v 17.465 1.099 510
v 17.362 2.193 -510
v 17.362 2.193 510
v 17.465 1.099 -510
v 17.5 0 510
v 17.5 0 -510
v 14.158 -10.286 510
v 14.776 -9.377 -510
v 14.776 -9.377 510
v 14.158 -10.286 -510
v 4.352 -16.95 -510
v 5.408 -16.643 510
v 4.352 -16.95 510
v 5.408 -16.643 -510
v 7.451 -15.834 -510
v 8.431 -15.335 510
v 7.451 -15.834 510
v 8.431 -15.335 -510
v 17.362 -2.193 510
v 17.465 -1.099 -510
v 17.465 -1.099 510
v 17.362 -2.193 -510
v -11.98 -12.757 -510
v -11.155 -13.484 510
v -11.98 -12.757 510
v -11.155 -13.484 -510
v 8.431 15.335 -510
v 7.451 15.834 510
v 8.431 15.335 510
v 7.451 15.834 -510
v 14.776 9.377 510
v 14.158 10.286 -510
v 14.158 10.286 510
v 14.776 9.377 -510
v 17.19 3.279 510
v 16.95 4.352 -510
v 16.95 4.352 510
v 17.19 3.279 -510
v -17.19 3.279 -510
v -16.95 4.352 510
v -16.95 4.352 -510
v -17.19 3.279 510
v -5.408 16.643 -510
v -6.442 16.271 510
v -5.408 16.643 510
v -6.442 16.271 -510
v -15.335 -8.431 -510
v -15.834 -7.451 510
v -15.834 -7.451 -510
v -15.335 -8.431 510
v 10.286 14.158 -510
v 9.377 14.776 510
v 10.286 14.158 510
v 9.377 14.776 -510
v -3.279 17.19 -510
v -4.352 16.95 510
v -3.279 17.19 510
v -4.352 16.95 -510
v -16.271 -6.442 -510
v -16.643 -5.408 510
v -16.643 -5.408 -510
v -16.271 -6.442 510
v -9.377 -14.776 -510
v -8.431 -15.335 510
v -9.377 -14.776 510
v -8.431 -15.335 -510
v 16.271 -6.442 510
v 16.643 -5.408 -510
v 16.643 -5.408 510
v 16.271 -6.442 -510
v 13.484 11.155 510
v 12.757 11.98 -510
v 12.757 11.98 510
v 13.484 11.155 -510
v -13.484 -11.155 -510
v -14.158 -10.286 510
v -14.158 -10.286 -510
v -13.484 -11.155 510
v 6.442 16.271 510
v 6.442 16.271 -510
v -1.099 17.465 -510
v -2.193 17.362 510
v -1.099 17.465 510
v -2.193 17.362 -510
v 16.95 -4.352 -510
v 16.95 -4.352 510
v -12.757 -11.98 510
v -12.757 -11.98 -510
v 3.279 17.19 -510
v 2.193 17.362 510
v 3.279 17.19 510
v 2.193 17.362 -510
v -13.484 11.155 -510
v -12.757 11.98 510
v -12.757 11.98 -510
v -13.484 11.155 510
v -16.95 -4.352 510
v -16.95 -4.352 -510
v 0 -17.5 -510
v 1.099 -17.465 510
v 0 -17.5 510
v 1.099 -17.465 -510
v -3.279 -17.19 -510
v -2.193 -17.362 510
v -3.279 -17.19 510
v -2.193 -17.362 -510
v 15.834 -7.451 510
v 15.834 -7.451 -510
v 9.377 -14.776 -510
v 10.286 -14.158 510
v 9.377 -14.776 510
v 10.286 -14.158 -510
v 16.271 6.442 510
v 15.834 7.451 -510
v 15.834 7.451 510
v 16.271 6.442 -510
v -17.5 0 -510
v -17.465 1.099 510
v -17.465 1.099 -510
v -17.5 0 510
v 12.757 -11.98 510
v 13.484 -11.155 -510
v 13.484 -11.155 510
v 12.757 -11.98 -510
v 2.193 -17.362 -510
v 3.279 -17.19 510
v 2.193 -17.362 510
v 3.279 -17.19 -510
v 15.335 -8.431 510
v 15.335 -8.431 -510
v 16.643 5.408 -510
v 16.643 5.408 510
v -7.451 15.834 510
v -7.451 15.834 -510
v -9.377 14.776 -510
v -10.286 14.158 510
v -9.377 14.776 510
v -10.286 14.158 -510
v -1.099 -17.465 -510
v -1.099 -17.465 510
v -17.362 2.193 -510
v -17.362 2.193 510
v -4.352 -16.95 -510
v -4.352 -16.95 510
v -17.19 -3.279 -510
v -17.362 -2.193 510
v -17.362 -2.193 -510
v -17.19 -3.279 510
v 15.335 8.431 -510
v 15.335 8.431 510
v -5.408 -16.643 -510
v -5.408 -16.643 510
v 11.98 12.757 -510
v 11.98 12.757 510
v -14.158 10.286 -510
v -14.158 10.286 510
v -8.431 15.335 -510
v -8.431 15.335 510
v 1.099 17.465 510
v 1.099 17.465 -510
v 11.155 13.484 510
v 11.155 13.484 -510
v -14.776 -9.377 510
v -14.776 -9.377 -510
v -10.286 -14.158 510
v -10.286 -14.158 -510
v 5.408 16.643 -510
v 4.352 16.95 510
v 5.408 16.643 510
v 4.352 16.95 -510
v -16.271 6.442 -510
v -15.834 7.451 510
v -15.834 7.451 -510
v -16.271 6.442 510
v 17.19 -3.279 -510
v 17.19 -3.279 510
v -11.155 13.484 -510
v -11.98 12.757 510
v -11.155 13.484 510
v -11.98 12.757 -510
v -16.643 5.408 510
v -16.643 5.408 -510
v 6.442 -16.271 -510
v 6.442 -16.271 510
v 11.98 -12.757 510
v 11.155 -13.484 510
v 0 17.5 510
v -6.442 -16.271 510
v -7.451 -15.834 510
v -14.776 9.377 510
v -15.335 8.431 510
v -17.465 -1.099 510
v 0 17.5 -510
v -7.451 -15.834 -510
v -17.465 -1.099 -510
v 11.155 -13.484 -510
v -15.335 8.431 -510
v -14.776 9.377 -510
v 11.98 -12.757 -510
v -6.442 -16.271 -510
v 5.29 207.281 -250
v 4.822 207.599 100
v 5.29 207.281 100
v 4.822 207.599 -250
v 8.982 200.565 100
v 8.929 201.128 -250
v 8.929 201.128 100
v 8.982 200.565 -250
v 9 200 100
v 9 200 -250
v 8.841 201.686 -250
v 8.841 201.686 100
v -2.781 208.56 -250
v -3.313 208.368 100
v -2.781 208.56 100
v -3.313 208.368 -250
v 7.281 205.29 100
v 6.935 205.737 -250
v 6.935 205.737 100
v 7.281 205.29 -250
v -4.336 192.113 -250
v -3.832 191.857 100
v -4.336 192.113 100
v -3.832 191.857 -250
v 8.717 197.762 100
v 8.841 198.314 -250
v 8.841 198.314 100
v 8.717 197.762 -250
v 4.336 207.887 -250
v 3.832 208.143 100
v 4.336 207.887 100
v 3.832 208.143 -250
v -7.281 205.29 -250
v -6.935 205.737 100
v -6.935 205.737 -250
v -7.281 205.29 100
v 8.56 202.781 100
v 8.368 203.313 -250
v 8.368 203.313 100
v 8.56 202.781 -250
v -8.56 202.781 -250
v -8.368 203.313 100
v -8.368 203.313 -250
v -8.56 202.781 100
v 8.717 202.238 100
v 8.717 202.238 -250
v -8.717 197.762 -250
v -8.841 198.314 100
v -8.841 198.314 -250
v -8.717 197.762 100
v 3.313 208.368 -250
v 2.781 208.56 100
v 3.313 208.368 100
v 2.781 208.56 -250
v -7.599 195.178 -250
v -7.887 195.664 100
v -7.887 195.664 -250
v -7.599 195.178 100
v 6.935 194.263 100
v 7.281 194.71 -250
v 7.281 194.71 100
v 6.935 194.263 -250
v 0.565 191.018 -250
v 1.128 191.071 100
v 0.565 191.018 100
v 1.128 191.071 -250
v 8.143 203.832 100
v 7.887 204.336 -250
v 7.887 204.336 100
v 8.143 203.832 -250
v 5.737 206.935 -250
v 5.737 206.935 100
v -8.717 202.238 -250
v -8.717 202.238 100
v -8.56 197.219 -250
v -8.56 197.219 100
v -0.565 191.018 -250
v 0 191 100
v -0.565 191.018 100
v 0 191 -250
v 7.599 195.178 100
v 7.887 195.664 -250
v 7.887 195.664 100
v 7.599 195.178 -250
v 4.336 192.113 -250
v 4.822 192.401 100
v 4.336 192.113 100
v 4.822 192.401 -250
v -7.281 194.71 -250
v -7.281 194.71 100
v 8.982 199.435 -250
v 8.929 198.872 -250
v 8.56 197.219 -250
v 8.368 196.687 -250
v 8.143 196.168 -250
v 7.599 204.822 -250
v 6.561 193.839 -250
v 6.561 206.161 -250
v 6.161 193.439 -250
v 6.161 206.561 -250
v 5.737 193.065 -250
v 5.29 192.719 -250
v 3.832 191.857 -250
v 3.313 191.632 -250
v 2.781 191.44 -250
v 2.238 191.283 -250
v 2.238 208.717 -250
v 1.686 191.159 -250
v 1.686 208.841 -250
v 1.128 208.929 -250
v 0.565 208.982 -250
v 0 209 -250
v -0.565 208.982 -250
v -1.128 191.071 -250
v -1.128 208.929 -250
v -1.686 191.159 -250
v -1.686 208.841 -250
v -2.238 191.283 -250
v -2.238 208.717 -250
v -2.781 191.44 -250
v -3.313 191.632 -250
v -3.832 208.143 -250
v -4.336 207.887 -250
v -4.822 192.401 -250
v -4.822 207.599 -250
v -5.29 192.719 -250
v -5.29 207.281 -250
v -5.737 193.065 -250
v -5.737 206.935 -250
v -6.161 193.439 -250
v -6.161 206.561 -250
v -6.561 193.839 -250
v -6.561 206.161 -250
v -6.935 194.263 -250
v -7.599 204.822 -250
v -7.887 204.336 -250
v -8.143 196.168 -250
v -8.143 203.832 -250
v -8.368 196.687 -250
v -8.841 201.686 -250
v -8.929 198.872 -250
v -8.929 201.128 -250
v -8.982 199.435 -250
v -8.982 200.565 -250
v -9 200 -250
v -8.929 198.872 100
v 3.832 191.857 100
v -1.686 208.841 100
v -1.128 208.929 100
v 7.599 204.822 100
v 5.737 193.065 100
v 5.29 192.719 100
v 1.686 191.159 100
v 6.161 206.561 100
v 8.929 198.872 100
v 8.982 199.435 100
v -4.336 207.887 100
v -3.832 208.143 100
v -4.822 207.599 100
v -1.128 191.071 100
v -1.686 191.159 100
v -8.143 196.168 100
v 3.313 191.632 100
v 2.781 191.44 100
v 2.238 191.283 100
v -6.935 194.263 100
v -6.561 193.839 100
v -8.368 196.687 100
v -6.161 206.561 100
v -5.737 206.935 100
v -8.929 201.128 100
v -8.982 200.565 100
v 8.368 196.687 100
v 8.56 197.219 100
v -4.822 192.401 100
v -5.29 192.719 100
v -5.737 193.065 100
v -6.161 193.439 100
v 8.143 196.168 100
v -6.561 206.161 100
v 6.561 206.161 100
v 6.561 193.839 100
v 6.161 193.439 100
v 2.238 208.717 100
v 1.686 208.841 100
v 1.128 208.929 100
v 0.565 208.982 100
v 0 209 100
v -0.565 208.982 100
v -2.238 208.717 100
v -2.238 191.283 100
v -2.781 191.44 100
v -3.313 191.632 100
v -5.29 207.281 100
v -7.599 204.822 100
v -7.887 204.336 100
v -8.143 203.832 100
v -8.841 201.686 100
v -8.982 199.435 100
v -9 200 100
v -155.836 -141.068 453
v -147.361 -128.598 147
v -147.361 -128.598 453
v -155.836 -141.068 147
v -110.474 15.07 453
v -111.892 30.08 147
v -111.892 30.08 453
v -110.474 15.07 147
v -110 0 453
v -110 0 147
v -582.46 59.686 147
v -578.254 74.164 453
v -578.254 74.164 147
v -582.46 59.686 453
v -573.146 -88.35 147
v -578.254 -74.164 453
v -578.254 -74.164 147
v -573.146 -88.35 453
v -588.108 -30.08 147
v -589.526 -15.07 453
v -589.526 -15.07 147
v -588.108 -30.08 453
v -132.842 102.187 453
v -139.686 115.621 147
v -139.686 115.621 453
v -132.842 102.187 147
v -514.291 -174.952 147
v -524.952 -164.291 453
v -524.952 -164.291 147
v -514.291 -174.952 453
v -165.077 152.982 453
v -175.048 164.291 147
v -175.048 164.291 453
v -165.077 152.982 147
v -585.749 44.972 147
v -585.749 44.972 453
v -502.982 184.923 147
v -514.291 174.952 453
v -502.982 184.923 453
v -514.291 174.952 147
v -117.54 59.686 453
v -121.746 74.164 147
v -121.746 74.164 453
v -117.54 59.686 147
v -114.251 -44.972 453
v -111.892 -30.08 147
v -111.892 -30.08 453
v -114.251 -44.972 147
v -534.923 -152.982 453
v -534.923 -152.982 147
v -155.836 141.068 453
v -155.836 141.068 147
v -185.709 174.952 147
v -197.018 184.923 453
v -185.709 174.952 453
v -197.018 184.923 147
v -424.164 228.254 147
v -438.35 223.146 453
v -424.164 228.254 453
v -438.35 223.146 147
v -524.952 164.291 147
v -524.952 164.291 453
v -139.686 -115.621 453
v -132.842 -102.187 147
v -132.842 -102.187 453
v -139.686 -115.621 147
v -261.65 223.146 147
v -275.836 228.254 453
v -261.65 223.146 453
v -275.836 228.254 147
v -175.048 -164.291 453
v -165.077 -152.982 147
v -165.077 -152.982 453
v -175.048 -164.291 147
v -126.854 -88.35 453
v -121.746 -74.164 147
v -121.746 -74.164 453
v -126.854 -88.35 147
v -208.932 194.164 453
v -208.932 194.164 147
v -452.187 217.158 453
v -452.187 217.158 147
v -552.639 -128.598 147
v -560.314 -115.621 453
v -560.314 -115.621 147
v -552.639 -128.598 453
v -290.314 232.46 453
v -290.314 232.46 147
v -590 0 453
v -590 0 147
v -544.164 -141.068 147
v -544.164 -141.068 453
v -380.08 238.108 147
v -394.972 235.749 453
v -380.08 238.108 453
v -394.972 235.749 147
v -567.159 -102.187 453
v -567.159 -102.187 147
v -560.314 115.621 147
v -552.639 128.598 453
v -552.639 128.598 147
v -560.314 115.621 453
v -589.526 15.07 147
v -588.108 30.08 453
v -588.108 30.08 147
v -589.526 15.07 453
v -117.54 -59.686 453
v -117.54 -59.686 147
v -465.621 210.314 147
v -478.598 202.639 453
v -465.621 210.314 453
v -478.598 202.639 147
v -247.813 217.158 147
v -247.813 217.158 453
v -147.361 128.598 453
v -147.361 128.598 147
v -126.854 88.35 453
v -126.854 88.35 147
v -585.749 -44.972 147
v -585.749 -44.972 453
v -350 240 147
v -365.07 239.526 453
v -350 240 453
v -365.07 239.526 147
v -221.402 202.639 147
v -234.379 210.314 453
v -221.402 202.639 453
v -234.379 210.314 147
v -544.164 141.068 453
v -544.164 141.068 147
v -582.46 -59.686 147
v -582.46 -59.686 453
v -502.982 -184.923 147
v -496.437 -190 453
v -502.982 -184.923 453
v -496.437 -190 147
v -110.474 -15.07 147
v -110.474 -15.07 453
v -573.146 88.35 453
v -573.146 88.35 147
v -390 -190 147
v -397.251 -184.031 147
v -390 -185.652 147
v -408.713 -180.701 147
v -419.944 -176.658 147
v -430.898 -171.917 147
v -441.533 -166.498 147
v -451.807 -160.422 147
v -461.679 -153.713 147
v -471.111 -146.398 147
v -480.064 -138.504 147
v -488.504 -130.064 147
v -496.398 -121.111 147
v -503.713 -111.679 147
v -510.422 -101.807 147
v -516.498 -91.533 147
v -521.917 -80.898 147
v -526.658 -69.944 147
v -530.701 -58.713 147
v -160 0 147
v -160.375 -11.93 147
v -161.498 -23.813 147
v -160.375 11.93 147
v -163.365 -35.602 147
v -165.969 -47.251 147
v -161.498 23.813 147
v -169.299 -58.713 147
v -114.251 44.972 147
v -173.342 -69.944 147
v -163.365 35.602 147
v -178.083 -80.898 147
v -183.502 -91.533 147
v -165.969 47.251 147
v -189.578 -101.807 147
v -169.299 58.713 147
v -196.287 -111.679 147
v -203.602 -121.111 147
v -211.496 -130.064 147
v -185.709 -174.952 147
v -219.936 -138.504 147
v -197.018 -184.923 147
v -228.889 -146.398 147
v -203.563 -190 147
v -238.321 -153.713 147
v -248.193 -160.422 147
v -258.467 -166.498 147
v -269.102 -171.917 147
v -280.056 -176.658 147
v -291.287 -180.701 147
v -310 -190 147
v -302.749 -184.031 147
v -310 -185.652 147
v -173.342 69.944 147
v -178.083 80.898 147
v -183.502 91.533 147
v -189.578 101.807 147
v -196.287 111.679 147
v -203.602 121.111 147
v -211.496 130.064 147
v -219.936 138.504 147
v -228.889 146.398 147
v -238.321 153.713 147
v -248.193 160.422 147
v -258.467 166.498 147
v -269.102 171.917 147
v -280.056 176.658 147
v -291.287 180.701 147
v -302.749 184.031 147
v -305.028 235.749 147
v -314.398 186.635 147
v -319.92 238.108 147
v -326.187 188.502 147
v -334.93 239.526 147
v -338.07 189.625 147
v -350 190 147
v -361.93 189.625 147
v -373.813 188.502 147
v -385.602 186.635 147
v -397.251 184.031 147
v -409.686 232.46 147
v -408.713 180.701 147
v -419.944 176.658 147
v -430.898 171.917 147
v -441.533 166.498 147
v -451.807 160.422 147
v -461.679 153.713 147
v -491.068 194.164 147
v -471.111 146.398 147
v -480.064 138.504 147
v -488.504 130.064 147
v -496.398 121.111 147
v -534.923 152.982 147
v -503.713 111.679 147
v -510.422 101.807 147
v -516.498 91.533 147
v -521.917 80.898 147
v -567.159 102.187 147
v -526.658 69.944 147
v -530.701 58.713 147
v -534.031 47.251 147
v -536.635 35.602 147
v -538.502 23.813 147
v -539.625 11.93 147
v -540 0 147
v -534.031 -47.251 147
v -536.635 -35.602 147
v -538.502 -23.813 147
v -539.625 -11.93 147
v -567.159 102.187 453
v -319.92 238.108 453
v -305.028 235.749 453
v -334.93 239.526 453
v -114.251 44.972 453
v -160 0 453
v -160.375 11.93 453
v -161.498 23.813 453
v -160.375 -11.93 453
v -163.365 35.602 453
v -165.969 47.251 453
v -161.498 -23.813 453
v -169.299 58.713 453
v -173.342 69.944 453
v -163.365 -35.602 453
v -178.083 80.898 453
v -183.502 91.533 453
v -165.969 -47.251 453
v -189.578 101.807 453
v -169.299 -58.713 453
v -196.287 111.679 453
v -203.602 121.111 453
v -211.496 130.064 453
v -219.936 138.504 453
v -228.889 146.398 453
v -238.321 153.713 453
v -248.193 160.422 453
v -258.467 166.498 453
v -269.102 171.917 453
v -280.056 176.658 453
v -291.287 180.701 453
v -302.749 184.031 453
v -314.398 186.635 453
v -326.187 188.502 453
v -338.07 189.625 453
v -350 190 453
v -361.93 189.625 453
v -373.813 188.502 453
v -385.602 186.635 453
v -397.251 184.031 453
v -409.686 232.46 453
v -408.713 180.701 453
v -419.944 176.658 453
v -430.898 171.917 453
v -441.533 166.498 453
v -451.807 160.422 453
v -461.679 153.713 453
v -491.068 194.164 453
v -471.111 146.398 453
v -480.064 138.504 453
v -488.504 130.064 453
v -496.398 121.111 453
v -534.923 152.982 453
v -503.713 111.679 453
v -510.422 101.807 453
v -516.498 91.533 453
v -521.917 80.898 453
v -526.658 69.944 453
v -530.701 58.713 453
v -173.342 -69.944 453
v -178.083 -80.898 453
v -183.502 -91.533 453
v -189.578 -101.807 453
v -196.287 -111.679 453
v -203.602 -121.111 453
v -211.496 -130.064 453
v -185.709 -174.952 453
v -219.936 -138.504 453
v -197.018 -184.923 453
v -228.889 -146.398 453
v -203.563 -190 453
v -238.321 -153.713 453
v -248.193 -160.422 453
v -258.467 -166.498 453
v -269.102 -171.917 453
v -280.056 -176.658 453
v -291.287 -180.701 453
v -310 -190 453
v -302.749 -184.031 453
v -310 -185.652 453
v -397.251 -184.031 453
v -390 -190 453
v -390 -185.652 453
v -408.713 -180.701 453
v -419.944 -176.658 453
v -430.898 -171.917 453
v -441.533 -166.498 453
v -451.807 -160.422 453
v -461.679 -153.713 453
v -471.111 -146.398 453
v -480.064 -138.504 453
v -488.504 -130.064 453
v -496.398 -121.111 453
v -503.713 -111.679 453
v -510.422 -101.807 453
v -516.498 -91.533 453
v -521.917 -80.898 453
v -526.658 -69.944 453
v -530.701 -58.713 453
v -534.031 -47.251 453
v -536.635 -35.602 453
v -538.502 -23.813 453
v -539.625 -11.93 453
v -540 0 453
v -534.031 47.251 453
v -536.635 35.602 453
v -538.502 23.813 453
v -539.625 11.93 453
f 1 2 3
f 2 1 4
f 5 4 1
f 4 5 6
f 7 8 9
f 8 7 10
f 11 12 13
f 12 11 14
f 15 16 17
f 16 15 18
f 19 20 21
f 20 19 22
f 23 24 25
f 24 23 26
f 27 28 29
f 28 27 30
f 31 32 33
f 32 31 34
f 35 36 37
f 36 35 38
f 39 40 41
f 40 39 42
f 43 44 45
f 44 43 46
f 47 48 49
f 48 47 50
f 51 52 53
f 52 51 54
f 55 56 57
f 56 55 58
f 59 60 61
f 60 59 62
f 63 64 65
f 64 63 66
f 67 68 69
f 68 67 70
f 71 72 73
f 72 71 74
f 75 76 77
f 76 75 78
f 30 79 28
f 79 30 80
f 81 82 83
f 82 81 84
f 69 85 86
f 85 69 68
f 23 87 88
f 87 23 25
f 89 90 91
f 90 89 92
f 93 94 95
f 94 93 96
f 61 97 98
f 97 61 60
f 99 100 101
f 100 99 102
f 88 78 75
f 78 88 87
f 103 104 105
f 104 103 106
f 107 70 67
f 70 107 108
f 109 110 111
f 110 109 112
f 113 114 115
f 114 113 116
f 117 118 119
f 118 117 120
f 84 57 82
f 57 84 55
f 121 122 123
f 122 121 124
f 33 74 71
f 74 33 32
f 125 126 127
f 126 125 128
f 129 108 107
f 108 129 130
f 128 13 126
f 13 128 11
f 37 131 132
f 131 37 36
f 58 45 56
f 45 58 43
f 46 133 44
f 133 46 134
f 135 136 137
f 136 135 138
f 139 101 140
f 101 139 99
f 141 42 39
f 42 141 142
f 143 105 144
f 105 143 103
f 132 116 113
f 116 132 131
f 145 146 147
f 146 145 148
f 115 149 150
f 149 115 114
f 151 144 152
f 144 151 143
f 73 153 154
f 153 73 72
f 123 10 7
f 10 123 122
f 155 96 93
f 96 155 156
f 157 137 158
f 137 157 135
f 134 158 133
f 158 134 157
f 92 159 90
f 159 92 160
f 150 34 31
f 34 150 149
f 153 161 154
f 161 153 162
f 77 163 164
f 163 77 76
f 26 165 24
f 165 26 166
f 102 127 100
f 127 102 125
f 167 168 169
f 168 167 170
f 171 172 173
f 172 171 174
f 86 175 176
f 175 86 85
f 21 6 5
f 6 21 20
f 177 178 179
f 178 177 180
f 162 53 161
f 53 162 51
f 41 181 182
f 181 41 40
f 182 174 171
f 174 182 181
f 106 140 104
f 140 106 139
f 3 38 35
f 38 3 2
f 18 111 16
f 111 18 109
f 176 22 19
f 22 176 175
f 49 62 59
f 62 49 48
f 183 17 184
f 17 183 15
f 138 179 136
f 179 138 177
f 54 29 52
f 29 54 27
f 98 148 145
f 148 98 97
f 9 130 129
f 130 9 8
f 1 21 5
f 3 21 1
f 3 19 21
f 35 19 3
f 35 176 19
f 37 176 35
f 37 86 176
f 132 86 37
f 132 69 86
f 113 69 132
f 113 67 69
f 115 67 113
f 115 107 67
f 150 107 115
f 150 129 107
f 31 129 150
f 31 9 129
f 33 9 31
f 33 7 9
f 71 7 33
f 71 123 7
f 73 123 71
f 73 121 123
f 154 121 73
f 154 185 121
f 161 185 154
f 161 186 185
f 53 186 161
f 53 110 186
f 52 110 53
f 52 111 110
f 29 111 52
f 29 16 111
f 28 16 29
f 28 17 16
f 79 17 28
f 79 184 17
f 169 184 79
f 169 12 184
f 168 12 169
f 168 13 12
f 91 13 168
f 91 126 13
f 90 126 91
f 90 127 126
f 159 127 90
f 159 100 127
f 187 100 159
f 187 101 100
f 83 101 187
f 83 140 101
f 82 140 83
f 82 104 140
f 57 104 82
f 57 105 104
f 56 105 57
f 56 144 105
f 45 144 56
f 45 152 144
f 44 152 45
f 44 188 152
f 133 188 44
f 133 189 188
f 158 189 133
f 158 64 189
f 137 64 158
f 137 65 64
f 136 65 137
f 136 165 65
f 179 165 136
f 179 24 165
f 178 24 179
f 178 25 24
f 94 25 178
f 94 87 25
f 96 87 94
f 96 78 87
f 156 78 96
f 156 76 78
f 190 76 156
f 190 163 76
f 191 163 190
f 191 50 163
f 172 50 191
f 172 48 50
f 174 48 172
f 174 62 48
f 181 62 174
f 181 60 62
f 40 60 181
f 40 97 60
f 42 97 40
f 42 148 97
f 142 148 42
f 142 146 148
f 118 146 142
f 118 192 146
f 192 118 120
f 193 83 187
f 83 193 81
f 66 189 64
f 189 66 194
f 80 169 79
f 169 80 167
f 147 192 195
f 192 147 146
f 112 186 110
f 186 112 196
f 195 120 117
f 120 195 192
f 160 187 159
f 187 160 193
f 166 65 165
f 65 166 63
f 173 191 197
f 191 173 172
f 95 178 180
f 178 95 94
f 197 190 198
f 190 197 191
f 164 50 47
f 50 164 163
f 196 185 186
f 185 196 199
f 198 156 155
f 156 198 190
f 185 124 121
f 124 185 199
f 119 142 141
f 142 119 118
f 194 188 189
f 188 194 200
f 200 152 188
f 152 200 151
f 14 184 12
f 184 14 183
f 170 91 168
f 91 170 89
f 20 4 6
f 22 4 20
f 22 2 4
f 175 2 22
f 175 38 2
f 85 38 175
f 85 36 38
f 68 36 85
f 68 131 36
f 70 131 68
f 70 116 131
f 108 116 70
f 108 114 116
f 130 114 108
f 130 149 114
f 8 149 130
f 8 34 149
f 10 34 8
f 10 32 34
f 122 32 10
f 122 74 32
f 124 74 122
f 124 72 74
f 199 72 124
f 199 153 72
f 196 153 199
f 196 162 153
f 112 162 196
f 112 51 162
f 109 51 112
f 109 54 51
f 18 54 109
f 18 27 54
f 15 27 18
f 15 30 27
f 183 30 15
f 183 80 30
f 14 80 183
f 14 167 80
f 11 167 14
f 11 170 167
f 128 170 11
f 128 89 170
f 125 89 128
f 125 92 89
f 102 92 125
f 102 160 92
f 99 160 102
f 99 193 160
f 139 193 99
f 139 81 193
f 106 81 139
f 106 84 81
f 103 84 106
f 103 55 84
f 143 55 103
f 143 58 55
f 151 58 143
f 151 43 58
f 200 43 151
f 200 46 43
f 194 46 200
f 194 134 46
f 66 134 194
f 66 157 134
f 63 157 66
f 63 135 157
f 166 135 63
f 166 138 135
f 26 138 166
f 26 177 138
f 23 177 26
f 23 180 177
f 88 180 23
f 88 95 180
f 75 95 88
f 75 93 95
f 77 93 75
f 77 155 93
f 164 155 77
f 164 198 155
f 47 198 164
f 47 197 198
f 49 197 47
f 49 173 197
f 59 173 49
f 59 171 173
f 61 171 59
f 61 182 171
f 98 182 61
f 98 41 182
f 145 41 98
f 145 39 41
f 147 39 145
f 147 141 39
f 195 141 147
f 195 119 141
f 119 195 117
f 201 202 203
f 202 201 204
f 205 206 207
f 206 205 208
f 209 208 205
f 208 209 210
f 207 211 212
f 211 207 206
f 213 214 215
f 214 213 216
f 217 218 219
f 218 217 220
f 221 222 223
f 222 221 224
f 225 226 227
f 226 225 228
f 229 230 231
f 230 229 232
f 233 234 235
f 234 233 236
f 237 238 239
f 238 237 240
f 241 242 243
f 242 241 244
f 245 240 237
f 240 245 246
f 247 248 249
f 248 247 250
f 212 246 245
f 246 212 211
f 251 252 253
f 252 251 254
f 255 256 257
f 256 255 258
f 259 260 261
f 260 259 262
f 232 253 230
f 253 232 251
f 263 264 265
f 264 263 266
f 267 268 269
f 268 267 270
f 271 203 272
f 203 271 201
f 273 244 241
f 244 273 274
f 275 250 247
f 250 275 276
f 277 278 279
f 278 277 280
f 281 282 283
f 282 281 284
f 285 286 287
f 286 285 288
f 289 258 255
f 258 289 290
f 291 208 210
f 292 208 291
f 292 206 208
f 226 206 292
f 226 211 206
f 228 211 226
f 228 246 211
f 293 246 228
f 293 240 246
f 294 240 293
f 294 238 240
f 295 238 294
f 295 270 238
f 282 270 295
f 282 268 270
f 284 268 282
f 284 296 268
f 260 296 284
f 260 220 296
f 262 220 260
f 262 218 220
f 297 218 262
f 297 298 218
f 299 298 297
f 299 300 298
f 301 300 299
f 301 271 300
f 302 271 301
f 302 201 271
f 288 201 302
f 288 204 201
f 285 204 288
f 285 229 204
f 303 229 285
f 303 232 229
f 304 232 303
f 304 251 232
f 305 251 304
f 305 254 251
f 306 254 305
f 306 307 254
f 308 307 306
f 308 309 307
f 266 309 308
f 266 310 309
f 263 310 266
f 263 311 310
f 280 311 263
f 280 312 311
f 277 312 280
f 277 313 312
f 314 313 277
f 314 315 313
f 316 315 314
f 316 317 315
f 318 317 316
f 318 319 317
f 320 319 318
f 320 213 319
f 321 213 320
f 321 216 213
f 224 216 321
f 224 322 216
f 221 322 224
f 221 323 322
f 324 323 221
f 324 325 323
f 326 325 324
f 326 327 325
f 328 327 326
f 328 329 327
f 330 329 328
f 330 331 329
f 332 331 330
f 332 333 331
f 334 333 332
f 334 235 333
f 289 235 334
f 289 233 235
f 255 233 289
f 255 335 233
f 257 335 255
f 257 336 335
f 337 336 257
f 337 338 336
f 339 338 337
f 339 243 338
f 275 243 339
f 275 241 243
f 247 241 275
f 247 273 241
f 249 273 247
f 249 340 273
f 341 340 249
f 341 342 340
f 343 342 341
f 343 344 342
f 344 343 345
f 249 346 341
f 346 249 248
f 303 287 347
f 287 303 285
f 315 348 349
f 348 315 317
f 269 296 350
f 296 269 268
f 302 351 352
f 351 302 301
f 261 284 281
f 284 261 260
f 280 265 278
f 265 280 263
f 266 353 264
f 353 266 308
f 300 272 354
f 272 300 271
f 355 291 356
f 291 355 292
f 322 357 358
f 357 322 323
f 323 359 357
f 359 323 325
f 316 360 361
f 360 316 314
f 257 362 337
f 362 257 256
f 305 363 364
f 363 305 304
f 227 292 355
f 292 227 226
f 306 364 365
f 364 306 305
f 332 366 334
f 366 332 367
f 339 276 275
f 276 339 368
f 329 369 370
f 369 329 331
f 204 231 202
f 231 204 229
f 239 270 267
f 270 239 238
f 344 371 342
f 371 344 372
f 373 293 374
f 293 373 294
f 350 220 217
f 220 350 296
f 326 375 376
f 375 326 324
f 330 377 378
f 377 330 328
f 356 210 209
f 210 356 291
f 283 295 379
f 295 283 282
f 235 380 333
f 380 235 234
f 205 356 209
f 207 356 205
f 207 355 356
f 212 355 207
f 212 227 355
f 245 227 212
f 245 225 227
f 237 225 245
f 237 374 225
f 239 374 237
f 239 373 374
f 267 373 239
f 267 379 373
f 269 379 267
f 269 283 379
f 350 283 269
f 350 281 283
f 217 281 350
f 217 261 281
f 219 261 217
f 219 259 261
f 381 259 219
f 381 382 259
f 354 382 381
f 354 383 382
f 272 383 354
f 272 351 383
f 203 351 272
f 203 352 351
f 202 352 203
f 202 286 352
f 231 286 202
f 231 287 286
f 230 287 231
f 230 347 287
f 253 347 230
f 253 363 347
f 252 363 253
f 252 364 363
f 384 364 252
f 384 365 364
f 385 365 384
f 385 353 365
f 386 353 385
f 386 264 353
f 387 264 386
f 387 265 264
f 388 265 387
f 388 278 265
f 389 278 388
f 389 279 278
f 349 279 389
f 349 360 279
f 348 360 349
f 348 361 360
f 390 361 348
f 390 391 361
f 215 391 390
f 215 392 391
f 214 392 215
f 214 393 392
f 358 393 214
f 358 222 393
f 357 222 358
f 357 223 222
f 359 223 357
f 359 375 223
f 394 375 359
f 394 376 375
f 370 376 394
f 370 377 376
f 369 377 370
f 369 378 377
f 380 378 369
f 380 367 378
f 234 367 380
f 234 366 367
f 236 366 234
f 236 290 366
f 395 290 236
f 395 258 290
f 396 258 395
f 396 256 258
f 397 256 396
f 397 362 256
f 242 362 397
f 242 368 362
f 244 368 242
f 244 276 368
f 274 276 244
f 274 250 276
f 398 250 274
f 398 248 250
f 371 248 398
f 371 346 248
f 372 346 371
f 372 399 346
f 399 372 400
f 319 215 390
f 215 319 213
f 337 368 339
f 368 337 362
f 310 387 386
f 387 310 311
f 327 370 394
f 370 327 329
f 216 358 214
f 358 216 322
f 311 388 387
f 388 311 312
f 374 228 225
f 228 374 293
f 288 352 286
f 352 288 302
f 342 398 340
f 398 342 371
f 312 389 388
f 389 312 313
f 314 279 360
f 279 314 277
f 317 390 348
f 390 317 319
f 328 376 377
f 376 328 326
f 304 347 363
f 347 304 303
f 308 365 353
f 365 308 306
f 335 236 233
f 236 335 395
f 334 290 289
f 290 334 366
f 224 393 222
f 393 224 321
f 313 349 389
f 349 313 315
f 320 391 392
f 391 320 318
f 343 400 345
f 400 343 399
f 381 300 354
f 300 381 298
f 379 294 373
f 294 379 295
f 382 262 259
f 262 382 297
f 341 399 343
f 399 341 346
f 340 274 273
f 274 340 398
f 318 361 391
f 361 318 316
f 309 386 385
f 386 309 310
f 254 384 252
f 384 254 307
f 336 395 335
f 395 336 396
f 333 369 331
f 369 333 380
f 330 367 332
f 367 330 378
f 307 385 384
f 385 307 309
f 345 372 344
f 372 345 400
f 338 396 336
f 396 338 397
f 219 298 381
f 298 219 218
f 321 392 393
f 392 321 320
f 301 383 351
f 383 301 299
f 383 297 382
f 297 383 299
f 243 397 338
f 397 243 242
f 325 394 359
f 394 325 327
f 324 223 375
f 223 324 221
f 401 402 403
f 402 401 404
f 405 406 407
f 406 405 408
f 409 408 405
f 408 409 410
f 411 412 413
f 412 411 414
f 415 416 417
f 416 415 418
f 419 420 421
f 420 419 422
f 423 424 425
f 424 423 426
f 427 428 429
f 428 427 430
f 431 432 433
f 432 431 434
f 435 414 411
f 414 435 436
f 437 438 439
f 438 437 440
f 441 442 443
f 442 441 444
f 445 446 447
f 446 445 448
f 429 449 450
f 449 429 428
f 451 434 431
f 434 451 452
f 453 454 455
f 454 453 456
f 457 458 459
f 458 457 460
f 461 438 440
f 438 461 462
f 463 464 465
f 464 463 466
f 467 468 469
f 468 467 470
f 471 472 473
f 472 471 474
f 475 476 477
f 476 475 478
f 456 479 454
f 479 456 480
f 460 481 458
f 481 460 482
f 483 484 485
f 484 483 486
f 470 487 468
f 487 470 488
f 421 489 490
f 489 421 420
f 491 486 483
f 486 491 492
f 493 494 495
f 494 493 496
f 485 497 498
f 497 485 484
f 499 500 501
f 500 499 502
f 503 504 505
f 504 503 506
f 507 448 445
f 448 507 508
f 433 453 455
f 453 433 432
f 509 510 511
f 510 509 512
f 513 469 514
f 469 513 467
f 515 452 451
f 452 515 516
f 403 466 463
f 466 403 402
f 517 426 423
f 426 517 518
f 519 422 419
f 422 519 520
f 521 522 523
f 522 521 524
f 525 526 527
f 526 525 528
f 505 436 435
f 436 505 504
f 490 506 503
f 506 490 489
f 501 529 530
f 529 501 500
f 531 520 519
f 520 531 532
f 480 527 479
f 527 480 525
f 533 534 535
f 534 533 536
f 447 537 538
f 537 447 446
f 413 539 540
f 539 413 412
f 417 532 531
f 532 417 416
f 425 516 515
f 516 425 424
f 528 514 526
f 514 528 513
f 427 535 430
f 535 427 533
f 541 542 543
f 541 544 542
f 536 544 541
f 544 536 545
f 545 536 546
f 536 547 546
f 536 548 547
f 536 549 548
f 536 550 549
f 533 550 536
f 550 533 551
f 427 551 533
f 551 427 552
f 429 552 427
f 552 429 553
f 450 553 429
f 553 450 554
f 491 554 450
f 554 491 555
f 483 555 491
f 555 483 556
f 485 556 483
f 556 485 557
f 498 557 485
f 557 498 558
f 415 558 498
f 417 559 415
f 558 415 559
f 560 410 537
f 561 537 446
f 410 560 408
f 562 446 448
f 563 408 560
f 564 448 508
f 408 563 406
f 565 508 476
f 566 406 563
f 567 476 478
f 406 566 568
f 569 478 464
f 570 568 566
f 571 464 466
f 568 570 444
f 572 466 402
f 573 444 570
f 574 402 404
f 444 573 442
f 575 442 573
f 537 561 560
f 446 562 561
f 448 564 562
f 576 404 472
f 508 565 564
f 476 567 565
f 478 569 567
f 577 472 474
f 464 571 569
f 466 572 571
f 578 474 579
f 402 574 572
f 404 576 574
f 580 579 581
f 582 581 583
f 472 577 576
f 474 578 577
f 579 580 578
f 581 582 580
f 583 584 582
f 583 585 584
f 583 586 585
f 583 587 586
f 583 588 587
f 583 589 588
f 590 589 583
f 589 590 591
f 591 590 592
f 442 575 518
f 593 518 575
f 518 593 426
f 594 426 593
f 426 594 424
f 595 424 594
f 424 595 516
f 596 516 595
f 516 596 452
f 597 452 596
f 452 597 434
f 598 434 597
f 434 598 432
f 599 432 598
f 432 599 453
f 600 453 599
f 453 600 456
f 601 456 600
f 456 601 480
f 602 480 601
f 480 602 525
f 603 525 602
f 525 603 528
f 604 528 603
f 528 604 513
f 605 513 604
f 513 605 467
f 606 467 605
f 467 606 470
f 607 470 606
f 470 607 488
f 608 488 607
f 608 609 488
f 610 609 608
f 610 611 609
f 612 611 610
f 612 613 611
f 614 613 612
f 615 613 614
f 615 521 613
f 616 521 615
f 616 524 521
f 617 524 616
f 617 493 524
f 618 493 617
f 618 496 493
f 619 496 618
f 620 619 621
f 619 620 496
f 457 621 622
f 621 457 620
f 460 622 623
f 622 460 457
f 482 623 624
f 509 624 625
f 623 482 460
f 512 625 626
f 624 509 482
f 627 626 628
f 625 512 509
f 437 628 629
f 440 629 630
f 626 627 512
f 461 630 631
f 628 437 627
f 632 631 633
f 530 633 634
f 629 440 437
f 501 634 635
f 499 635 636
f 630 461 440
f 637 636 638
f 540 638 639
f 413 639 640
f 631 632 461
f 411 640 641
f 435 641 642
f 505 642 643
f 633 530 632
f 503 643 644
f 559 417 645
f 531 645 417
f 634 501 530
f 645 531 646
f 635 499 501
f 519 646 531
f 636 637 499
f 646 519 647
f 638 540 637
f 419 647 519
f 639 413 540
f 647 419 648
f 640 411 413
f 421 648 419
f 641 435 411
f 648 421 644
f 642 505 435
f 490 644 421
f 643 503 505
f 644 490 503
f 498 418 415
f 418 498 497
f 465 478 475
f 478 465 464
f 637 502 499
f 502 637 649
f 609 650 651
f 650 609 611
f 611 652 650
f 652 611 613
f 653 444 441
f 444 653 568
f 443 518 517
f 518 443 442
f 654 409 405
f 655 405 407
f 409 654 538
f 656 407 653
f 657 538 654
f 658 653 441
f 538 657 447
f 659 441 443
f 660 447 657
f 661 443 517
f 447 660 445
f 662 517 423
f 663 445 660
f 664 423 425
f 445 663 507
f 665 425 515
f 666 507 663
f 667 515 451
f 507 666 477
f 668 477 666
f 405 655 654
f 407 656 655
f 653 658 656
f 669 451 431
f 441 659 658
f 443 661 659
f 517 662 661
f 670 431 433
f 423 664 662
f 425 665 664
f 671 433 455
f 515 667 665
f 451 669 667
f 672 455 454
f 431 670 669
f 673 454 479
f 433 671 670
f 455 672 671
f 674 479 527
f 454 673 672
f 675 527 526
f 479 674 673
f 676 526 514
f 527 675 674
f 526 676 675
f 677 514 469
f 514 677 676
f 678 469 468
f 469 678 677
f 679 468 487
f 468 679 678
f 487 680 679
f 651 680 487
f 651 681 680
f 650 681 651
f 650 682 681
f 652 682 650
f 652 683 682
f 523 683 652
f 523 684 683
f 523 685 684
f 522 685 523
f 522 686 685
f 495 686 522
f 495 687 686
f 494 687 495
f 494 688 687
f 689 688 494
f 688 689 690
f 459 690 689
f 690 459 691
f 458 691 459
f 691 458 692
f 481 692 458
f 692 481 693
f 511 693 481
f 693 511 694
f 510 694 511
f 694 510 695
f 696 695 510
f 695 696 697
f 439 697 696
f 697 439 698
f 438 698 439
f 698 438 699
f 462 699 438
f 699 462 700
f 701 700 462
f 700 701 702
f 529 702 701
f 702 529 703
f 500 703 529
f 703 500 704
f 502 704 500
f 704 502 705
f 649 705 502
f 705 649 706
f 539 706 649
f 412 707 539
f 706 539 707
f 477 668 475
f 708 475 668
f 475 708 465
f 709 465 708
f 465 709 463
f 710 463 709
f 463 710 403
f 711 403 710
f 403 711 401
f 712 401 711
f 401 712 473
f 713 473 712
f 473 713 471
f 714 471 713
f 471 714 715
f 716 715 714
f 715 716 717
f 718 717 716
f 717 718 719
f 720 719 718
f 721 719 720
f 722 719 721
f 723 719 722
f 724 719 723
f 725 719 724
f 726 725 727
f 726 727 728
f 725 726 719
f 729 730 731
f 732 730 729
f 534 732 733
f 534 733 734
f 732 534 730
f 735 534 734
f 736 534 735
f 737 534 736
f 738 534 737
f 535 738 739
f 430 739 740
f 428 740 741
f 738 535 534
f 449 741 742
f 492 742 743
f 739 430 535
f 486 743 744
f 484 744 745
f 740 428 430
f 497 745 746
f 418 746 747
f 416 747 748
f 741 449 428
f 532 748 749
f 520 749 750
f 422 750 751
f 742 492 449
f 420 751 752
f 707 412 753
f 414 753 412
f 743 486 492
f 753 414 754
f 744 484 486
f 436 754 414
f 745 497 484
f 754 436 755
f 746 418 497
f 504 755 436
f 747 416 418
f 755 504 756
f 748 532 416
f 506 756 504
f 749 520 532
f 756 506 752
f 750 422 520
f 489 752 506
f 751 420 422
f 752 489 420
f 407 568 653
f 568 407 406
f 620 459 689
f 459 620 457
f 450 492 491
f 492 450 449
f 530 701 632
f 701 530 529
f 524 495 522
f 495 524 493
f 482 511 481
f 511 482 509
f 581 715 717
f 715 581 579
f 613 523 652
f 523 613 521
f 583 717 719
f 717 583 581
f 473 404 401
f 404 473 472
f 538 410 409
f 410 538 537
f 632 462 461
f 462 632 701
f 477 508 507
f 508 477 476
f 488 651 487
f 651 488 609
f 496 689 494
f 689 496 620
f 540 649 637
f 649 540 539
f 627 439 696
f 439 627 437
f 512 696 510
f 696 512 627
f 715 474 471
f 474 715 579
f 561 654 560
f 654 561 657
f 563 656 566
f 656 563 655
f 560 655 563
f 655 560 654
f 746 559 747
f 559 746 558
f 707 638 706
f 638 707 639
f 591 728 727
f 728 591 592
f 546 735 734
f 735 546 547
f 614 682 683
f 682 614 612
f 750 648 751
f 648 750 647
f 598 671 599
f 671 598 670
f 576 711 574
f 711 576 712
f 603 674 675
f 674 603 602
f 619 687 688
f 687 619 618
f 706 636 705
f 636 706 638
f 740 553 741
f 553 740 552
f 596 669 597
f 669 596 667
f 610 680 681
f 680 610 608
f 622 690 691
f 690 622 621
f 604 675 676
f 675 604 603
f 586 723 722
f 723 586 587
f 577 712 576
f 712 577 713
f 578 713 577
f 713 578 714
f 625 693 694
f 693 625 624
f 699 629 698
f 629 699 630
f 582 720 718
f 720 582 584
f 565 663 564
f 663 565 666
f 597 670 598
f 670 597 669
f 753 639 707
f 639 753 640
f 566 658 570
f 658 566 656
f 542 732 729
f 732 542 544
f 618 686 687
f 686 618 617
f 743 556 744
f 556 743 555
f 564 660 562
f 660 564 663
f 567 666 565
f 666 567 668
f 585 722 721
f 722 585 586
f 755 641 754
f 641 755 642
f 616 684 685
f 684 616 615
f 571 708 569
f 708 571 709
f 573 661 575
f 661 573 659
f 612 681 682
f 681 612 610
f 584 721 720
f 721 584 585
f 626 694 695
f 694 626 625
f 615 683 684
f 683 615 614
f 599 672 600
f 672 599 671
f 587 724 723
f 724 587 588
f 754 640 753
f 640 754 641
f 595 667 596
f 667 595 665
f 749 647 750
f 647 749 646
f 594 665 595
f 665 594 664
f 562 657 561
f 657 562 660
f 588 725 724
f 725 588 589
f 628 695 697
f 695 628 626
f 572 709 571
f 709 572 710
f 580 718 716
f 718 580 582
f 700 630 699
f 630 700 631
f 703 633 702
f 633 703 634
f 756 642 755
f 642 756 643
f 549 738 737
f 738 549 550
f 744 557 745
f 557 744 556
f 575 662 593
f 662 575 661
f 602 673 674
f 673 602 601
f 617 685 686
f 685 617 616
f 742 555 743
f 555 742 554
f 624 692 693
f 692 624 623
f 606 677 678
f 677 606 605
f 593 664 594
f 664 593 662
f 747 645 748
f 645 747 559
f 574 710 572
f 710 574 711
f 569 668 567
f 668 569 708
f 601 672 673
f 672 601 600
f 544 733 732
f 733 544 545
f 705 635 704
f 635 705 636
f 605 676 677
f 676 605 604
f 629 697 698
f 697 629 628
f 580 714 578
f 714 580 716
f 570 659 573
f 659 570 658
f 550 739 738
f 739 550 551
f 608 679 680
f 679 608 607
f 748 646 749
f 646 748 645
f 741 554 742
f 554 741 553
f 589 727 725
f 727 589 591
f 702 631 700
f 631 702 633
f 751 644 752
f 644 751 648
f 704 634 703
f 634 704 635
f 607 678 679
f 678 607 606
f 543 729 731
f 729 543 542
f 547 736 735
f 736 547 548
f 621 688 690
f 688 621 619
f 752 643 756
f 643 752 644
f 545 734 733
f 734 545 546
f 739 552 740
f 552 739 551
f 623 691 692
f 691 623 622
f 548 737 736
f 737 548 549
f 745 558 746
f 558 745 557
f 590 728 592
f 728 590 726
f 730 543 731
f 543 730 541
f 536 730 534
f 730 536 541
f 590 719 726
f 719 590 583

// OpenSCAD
// ============================================================================
// PROJECT: XXXG-00W0 WING GUNDAM ZERO EW - COGNITIVE CORE INFRA
// COMPONENT VAULT: BANDAI CAST RUNNER A - INTEGRATED SYSTEM CORES A1 & A2
// SYSTEM ENGINE: BIOCHEM-5000 PARAMETRIC COPROCESSOR INTEGRATION PARITY
// DESIGN SPECS: FIBONACCI HELICAL SIGNAL BUS & BATCH GAUSSIAN SOCKETS
// CONFIG METRIC: HARDWARE PACKAGING RE-ARCHITECTURE (1:1 actual metric)
// ============================================================================

$fn = 100; // High-precision circular segment resolution count

// Structural Constants Scaled 1:1 for a 16.7-Meter Airframe Scale (mm)
skull_total_height = 680;                // Total longitudinal vertical skull height (mm)
skull_inner_diameter = 380;              // Internal clear processing bay diameter (mm)
coprocessor_box_w = 180;                 // BIOCHEM-5000 processor block width (mm)
coprocessor_box_d = 90;                  // BIOCHEM-5000 processor block depth (mm)
harness_conduit_width = 80;             // Cast-in 4oz copper logic trace track (mm)

module Runner_A_AI_Head_Forge() {
    // Central Supply Injection Runner Axis (Molten Feed Line from Siphon Forge)
    color([0.25, 0.25, 0.28]) {
        cylinder(h = skull_total_height * 1.5, d = 35, center = true);
        translate() rotate() cylinder(h = 350, d = 18);
        translate([0, 200, -250]) rotate() cylinder(h = 350, d = 18);
    }
    
    // Instantiate Scaled NVIDIA-Faceted AI Receptacle Skull Components
    Cast_Internal_AI_Skull_Bay();
}

module Cast_Internal_AI_Skull_Bay() {
    // ---- PART A1: INTERNAL SKULL FRAME & BIOCHEM PROCESSOR RECEPTACLE ----
    translate([-350, 0, 300]) color([0.35, 0.35, 0.38]) { // Inner Frame Dark Spec
        difference() {
            // Main solid heavy-duty skull core framing casting block
            cylinder(h = skull_total_height * 0.45, d = skull_inner_diameter + 100, center = true);
            
            // Central Processing Core Excavation Bay (Houses the AI hardware block)
            cylinder(h = skull_total_height * 0.5, d = skull_inner_diameter, center = true);
            
            // BIOCHEM-5000 STOCHASTIC INTEGRATION TERMINAL [Milled out for batch seeds boards]
            translate()
                cube([coprocessor_box_w, coprocessor_box_d, 280], center = true);
            
            // PARAMETRIC FIBONACCI HELICAL SIGNAL BUS PATHS [Spiral trace channels cut inside walls]
            for (angle = [0 : 30 : 360]) {
                rotate([0, 0, angle])
                    translate([skull_inner_diameter/2 - 20, 0, 0])
                        cylinder(h = skull_total_height, d = 12, center = true);
            }
            
            // Continuous cast-in routing track for the 4oz solid-state wiring rails
            translate([0, -skull_inner_diameter/2 + 20, 0])
                cube([harness_conduit_width, 80, skull_total_height], center = true);
            
            // Slicing profile tool to generate an asymmetrical half-shell part component
            translate([0, -skull_inner_diameter * 1.5, 0])
                cube([skull_inner_diameter * 3, skull_inner_diameter * 2, skull_total_height * 2], center = true);
        }
    }
}

// Render Master Component to Parameter Workspace
Runner_A_AI_Head_Forge();
